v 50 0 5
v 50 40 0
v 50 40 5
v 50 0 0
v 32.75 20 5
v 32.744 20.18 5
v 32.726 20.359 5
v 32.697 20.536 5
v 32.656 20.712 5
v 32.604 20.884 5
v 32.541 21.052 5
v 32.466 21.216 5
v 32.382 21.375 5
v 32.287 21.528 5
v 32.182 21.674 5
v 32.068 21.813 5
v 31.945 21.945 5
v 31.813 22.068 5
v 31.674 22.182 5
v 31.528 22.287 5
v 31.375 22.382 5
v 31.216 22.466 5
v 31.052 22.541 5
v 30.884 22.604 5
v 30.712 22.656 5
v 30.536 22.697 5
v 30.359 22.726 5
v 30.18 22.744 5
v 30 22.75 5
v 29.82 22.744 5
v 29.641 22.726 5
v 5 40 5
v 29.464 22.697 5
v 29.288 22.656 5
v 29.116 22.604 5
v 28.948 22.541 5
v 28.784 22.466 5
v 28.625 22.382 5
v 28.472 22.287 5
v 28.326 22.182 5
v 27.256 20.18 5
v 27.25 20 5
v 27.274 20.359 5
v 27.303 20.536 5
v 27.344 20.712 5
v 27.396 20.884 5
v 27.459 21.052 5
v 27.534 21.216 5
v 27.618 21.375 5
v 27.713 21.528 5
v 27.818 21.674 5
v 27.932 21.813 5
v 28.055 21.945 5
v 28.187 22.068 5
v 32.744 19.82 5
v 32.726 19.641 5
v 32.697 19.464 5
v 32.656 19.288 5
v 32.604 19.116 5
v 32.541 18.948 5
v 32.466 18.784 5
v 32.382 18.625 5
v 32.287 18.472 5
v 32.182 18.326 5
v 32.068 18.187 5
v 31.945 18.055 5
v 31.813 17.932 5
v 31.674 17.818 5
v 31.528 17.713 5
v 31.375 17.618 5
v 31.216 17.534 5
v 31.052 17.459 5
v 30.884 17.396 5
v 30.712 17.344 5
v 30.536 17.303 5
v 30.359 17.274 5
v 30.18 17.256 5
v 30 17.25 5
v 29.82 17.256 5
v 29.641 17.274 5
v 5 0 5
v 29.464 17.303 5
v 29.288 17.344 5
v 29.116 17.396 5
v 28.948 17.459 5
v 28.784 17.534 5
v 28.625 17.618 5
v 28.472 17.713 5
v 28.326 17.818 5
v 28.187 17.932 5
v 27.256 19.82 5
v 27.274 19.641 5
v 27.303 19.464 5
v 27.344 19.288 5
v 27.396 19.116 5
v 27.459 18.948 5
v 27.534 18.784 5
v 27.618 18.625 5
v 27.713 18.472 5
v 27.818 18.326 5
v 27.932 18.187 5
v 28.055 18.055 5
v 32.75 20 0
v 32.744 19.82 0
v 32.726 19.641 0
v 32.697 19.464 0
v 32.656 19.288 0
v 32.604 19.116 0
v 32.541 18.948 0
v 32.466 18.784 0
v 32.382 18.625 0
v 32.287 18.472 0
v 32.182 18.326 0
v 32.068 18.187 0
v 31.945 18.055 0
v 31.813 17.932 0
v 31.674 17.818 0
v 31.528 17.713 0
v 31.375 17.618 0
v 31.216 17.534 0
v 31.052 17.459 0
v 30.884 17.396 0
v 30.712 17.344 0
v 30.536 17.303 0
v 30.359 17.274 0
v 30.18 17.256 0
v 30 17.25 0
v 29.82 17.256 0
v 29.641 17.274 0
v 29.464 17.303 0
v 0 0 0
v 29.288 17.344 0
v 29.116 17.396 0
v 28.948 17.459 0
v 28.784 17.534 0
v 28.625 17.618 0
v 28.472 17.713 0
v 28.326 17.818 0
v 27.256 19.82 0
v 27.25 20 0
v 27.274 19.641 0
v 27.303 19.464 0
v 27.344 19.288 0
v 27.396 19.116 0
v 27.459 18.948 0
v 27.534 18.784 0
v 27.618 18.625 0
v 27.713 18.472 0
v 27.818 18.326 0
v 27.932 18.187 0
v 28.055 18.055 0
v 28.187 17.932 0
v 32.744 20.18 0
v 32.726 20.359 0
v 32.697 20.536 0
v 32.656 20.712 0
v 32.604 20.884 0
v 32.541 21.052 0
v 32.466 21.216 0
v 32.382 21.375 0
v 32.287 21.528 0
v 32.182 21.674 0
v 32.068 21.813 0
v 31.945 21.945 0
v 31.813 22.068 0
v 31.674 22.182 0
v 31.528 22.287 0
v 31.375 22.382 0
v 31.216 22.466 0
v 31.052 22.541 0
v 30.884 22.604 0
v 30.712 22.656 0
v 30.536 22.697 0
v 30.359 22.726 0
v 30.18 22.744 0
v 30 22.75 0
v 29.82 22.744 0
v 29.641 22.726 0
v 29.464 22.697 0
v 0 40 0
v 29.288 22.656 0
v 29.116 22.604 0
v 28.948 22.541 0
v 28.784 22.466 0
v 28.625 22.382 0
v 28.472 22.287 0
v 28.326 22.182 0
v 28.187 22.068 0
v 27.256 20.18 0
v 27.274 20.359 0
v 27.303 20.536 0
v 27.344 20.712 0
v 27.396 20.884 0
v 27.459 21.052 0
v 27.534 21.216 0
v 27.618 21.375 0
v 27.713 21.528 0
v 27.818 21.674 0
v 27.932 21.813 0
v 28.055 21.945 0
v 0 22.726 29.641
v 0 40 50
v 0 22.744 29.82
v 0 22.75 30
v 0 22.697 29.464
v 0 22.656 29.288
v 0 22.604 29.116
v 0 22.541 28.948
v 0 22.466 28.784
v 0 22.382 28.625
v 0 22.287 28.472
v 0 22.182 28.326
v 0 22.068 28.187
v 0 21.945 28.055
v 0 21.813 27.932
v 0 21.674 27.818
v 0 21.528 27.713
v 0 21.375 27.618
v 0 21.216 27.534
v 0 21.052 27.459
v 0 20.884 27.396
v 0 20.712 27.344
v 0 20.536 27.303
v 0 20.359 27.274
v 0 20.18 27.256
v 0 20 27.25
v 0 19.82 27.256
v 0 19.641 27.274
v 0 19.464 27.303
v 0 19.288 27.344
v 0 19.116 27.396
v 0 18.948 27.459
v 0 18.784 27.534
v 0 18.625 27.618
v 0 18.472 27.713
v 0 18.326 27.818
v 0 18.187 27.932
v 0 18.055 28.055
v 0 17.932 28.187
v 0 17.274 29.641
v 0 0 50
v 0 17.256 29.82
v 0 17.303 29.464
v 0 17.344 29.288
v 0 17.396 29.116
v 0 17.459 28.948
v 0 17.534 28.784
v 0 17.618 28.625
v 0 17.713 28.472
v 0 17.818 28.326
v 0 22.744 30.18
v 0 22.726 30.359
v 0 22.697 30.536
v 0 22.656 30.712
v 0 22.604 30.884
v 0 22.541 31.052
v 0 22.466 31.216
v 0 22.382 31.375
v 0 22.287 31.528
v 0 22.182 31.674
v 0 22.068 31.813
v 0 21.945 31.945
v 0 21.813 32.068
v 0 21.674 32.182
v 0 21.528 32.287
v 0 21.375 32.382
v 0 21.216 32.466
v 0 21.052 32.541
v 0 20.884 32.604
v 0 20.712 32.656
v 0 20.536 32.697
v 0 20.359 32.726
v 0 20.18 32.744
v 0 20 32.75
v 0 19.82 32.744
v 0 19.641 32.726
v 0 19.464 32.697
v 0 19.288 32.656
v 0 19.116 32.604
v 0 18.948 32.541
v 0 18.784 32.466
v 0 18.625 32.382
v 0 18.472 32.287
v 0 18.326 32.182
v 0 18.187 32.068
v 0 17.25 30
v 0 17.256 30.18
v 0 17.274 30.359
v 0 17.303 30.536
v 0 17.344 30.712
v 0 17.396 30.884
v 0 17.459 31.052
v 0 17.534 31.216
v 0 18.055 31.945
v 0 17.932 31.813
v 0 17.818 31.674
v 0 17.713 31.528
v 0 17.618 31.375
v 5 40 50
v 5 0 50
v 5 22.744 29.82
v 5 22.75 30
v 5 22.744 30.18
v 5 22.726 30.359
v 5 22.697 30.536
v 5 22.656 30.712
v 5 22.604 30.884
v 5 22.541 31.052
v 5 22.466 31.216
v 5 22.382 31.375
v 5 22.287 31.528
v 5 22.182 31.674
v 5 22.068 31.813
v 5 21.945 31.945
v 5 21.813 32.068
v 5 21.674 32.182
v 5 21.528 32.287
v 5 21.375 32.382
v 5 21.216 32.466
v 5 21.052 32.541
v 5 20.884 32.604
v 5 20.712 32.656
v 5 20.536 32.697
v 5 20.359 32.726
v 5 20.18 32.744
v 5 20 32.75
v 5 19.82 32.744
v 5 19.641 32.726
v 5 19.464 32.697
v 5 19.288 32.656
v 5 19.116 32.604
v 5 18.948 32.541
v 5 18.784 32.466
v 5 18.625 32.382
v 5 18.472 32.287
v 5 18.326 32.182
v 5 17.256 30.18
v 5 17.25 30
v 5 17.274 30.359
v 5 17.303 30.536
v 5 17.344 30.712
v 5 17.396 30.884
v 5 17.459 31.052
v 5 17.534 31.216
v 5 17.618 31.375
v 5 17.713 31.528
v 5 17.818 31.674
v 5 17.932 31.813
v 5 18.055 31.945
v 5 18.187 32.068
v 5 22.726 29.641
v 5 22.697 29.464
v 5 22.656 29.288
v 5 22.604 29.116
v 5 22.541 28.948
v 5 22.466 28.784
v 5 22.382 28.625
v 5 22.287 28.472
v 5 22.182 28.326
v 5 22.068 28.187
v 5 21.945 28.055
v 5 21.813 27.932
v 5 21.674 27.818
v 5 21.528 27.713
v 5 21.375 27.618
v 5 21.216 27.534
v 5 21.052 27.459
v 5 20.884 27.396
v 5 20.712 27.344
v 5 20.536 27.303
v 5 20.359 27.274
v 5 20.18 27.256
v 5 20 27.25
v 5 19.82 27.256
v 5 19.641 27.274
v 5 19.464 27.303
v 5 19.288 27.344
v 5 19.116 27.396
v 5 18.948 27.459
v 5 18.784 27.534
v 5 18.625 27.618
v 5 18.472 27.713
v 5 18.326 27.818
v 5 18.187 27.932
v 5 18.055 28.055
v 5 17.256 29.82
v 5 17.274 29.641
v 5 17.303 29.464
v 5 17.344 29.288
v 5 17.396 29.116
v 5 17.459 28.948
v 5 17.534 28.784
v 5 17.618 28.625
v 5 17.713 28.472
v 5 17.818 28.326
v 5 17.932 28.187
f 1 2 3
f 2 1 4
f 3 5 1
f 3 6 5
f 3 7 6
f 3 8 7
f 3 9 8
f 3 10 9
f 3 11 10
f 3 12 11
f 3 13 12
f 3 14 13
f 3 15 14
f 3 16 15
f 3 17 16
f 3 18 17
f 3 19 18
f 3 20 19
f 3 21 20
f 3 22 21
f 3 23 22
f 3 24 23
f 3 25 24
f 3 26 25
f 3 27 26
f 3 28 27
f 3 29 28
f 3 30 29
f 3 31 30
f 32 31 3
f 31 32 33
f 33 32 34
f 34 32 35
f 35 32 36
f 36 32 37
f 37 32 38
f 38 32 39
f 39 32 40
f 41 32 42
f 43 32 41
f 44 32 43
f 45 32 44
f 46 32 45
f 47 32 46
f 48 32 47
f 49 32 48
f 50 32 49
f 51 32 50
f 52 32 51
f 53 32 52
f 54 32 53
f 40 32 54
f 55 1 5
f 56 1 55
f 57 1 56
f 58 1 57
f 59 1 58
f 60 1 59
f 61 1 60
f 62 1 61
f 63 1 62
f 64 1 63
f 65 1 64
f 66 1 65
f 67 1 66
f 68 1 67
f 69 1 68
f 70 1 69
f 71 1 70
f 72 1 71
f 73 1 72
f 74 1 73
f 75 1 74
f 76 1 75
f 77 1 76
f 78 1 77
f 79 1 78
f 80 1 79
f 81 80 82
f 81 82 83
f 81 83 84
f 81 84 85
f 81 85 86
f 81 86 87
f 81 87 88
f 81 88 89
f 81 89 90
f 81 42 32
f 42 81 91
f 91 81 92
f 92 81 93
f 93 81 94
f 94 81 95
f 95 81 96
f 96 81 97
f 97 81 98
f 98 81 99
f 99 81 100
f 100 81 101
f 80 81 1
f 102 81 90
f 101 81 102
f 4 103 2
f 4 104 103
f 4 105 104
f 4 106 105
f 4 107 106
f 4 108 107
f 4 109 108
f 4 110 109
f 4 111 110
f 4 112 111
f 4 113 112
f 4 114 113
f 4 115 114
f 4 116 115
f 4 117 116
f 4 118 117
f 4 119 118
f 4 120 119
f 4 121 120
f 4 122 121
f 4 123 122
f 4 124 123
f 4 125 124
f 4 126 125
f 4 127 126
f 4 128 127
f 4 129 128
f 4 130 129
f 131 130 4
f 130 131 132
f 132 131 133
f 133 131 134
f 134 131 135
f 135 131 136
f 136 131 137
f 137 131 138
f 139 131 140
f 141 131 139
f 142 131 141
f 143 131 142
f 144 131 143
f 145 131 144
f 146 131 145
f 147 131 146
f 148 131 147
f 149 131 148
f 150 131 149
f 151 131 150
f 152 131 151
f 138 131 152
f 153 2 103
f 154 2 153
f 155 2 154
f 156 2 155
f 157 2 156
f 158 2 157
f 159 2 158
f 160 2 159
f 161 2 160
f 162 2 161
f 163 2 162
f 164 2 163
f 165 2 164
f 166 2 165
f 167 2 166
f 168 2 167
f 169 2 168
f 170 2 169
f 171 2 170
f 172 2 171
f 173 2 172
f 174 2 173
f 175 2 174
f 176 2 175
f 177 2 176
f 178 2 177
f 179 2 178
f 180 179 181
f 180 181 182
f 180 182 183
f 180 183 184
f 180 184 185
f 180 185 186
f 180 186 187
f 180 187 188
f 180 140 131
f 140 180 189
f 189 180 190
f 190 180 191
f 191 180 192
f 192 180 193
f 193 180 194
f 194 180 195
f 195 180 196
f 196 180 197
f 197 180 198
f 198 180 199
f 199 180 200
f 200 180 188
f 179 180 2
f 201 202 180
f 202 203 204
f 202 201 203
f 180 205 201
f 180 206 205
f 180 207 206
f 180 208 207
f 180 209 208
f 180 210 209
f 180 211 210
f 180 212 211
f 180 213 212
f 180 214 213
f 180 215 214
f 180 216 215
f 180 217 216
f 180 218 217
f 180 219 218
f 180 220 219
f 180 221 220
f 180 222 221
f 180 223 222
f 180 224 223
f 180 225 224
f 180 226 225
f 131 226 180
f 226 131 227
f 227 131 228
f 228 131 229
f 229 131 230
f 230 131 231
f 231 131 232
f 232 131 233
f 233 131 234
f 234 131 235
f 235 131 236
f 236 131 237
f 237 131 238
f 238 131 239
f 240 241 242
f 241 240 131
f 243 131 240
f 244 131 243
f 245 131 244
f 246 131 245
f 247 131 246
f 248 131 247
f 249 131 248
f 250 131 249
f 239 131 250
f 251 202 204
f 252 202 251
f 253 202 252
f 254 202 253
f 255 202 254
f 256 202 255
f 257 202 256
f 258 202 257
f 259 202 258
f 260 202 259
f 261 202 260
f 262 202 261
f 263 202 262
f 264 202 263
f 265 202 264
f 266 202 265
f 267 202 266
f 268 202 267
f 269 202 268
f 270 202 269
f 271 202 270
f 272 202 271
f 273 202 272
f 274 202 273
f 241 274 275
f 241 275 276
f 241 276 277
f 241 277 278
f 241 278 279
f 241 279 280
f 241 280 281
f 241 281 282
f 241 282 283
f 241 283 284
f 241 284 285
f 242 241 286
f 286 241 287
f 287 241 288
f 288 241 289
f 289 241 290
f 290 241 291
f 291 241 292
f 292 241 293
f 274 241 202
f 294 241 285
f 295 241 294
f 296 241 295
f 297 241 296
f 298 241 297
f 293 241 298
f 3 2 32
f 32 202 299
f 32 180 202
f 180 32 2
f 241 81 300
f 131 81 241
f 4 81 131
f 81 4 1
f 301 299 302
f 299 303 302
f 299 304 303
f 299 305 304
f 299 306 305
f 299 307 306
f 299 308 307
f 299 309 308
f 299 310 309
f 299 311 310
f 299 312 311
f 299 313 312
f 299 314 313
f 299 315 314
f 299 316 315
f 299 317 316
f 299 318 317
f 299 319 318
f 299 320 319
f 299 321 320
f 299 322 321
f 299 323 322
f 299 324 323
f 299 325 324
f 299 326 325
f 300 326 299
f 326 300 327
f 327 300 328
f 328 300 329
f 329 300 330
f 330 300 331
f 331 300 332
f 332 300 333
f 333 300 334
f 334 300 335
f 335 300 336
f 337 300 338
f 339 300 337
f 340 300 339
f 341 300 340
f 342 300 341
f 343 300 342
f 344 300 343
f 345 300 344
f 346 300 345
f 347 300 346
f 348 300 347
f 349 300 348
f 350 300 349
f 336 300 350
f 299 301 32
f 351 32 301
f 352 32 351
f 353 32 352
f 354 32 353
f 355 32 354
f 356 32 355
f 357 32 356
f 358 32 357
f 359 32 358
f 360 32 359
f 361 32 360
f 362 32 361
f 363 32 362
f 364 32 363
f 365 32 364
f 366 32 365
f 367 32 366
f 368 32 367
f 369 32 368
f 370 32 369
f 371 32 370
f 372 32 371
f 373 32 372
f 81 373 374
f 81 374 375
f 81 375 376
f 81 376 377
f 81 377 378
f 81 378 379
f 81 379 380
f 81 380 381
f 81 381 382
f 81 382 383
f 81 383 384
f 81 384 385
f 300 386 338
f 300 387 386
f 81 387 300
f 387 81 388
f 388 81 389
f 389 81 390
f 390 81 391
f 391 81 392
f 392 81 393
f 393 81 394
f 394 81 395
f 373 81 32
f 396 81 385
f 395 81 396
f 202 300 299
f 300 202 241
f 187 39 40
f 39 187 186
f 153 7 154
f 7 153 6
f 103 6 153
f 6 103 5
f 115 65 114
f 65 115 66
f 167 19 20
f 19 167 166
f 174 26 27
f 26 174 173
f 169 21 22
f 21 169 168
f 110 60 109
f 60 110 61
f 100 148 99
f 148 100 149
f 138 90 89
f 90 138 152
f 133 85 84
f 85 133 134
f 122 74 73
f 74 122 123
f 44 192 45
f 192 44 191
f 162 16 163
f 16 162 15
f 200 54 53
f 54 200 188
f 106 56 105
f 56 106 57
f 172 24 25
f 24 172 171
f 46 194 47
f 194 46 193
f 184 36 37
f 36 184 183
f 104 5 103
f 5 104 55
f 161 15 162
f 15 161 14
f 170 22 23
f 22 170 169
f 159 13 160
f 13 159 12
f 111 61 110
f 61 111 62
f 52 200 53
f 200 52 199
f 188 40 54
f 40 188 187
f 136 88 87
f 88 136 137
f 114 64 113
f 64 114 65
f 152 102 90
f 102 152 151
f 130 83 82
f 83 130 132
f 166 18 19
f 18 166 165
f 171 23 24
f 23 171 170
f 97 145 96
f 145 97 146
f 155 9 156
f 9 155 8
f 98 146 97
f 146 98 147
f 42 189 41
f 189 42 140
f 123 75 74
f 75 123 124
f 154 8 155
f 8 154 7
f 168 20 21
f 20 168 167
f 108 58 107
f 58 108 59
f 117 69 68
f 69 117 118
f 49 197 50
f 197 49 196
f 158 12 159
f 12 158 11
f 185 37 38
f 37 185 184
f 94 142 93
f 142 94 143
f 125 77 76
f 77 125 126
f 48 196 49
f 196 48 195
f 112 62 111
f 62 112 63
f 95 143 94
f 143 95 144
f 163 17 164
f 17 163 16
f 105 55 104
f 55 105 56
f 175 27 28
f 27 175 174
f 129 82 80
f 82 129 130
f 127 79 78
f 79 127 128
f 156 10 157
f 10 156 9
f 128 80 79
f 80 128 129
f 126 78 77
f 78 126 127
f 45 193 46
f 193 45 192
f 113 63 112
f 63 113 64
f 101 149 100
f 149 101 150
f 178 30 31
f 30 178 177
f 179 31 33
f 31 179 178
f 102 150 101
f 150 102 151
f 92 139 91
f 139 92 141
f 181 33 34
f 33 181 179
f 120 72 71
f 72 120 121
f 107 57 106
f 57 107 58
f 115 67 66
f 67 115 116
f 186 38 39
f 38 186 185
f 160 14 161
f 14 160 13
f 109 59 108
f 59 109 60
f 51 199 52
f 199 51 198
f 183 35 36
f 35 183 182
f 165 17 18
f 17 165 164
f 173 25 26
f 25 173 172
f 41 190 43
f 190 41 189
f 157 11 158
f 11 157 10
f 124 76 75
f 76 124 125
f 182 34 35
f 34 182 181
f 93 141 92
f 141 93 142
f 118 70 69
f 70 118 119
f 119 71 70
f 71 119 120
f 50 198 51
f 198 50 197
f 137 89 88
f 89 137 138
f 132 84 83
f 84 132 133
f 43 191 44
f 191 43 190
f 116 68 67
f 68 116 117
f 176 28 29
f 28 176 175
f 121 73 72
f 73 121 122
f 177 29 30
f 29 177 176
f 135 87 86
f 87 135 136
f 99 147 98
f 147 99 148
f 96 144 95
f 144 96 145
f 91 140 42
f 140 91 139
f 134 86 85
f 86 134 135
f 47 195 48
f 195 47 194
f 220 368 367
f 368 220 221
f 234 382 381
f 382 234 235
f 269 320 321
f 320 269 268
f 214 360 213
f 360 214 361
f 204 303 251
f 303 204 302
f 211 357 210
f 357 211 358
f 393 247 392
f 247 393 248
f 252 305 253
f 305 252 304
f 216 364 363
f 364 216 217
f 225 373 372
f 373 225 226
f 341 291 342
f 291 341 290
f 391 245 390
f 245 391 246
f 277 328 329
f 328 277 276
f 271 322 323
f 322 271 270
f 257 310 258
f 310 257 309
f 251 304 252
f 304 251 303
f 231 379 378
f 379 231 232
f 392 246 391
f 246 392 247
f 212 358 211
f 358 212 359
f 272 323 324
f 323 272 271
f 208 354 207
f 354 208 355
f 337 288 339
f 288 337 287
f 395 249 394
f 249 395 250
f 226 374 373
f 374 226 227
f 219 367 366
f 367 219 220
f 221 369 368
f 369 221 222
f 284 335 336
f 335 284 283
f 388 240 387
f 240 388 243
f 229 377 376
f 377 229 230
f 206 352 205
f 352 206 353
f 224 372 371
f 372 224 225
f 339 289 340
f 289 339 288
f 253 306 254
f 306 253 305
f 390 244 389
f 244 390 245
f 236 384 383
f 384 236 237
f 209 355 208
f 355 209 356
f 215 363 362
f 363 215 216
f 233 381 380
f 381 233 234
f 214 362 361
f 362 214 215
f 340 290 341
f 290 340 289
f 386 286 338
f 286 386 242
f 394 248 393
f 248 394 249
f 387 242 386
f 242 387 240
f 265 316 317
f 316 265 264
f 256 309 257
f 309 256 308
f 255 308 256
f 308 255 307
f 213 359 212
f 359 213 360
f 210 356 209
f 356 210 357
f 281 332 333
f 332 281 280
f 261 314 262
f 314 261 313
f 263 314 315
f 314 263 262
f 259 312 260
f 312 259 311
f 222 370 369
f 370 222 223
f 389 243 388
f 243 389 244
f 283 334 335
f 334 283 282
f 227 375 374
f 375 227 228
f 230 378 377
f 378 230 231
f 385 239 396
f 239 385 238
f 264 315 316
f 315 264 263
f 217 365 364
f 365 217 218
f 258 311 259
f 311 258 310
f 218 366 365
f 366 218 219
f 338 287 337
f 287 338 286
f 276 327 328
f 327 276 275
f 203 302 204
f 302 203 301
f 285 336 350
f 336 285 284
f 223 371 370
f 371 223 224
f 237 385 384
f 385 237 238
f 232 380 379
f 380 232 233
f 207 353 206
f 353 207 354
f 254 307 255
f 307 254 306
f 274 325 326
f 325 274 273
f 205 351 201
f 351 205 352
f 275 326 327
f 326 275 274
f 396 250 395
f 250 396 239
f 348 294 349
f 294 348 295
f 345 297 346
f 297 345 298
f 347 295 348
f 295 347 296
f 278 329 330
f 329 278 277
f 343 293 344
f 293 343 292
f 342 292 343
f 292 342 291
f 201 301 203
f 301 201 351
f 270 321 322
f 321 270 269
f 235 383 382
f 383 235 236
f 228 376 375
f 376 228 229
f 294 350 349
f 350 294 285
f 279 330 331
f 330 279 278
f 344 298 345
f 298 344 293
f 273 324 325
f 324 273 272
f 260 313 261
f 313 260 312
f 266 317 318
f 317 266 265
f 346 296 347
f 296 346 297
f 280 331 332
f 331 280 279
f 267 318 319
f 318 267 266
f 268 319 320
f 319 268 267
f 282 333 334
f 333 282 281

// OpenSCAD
leg_length = 50; leg_width = 40; wall_thickness = 5; hole_diameter = 5.5; hole_offset = 30;
$fn = 96;
difference() {
  union() {
    cube([leg_length, leg_width, wall_thickness]);
    cube([wall_thickness, leg_width, leg_length]);
  }
  translate([hole_offset, leg_width/2, -1]) cylinder(d = hole_diameter, h = wall_thickness + 2);
  translate([-1, leg_width/2, hole_offset]) rotate([0, 90, 0]) cylinder(d = hole_diameter, h = wall_thickness + 2);
}
